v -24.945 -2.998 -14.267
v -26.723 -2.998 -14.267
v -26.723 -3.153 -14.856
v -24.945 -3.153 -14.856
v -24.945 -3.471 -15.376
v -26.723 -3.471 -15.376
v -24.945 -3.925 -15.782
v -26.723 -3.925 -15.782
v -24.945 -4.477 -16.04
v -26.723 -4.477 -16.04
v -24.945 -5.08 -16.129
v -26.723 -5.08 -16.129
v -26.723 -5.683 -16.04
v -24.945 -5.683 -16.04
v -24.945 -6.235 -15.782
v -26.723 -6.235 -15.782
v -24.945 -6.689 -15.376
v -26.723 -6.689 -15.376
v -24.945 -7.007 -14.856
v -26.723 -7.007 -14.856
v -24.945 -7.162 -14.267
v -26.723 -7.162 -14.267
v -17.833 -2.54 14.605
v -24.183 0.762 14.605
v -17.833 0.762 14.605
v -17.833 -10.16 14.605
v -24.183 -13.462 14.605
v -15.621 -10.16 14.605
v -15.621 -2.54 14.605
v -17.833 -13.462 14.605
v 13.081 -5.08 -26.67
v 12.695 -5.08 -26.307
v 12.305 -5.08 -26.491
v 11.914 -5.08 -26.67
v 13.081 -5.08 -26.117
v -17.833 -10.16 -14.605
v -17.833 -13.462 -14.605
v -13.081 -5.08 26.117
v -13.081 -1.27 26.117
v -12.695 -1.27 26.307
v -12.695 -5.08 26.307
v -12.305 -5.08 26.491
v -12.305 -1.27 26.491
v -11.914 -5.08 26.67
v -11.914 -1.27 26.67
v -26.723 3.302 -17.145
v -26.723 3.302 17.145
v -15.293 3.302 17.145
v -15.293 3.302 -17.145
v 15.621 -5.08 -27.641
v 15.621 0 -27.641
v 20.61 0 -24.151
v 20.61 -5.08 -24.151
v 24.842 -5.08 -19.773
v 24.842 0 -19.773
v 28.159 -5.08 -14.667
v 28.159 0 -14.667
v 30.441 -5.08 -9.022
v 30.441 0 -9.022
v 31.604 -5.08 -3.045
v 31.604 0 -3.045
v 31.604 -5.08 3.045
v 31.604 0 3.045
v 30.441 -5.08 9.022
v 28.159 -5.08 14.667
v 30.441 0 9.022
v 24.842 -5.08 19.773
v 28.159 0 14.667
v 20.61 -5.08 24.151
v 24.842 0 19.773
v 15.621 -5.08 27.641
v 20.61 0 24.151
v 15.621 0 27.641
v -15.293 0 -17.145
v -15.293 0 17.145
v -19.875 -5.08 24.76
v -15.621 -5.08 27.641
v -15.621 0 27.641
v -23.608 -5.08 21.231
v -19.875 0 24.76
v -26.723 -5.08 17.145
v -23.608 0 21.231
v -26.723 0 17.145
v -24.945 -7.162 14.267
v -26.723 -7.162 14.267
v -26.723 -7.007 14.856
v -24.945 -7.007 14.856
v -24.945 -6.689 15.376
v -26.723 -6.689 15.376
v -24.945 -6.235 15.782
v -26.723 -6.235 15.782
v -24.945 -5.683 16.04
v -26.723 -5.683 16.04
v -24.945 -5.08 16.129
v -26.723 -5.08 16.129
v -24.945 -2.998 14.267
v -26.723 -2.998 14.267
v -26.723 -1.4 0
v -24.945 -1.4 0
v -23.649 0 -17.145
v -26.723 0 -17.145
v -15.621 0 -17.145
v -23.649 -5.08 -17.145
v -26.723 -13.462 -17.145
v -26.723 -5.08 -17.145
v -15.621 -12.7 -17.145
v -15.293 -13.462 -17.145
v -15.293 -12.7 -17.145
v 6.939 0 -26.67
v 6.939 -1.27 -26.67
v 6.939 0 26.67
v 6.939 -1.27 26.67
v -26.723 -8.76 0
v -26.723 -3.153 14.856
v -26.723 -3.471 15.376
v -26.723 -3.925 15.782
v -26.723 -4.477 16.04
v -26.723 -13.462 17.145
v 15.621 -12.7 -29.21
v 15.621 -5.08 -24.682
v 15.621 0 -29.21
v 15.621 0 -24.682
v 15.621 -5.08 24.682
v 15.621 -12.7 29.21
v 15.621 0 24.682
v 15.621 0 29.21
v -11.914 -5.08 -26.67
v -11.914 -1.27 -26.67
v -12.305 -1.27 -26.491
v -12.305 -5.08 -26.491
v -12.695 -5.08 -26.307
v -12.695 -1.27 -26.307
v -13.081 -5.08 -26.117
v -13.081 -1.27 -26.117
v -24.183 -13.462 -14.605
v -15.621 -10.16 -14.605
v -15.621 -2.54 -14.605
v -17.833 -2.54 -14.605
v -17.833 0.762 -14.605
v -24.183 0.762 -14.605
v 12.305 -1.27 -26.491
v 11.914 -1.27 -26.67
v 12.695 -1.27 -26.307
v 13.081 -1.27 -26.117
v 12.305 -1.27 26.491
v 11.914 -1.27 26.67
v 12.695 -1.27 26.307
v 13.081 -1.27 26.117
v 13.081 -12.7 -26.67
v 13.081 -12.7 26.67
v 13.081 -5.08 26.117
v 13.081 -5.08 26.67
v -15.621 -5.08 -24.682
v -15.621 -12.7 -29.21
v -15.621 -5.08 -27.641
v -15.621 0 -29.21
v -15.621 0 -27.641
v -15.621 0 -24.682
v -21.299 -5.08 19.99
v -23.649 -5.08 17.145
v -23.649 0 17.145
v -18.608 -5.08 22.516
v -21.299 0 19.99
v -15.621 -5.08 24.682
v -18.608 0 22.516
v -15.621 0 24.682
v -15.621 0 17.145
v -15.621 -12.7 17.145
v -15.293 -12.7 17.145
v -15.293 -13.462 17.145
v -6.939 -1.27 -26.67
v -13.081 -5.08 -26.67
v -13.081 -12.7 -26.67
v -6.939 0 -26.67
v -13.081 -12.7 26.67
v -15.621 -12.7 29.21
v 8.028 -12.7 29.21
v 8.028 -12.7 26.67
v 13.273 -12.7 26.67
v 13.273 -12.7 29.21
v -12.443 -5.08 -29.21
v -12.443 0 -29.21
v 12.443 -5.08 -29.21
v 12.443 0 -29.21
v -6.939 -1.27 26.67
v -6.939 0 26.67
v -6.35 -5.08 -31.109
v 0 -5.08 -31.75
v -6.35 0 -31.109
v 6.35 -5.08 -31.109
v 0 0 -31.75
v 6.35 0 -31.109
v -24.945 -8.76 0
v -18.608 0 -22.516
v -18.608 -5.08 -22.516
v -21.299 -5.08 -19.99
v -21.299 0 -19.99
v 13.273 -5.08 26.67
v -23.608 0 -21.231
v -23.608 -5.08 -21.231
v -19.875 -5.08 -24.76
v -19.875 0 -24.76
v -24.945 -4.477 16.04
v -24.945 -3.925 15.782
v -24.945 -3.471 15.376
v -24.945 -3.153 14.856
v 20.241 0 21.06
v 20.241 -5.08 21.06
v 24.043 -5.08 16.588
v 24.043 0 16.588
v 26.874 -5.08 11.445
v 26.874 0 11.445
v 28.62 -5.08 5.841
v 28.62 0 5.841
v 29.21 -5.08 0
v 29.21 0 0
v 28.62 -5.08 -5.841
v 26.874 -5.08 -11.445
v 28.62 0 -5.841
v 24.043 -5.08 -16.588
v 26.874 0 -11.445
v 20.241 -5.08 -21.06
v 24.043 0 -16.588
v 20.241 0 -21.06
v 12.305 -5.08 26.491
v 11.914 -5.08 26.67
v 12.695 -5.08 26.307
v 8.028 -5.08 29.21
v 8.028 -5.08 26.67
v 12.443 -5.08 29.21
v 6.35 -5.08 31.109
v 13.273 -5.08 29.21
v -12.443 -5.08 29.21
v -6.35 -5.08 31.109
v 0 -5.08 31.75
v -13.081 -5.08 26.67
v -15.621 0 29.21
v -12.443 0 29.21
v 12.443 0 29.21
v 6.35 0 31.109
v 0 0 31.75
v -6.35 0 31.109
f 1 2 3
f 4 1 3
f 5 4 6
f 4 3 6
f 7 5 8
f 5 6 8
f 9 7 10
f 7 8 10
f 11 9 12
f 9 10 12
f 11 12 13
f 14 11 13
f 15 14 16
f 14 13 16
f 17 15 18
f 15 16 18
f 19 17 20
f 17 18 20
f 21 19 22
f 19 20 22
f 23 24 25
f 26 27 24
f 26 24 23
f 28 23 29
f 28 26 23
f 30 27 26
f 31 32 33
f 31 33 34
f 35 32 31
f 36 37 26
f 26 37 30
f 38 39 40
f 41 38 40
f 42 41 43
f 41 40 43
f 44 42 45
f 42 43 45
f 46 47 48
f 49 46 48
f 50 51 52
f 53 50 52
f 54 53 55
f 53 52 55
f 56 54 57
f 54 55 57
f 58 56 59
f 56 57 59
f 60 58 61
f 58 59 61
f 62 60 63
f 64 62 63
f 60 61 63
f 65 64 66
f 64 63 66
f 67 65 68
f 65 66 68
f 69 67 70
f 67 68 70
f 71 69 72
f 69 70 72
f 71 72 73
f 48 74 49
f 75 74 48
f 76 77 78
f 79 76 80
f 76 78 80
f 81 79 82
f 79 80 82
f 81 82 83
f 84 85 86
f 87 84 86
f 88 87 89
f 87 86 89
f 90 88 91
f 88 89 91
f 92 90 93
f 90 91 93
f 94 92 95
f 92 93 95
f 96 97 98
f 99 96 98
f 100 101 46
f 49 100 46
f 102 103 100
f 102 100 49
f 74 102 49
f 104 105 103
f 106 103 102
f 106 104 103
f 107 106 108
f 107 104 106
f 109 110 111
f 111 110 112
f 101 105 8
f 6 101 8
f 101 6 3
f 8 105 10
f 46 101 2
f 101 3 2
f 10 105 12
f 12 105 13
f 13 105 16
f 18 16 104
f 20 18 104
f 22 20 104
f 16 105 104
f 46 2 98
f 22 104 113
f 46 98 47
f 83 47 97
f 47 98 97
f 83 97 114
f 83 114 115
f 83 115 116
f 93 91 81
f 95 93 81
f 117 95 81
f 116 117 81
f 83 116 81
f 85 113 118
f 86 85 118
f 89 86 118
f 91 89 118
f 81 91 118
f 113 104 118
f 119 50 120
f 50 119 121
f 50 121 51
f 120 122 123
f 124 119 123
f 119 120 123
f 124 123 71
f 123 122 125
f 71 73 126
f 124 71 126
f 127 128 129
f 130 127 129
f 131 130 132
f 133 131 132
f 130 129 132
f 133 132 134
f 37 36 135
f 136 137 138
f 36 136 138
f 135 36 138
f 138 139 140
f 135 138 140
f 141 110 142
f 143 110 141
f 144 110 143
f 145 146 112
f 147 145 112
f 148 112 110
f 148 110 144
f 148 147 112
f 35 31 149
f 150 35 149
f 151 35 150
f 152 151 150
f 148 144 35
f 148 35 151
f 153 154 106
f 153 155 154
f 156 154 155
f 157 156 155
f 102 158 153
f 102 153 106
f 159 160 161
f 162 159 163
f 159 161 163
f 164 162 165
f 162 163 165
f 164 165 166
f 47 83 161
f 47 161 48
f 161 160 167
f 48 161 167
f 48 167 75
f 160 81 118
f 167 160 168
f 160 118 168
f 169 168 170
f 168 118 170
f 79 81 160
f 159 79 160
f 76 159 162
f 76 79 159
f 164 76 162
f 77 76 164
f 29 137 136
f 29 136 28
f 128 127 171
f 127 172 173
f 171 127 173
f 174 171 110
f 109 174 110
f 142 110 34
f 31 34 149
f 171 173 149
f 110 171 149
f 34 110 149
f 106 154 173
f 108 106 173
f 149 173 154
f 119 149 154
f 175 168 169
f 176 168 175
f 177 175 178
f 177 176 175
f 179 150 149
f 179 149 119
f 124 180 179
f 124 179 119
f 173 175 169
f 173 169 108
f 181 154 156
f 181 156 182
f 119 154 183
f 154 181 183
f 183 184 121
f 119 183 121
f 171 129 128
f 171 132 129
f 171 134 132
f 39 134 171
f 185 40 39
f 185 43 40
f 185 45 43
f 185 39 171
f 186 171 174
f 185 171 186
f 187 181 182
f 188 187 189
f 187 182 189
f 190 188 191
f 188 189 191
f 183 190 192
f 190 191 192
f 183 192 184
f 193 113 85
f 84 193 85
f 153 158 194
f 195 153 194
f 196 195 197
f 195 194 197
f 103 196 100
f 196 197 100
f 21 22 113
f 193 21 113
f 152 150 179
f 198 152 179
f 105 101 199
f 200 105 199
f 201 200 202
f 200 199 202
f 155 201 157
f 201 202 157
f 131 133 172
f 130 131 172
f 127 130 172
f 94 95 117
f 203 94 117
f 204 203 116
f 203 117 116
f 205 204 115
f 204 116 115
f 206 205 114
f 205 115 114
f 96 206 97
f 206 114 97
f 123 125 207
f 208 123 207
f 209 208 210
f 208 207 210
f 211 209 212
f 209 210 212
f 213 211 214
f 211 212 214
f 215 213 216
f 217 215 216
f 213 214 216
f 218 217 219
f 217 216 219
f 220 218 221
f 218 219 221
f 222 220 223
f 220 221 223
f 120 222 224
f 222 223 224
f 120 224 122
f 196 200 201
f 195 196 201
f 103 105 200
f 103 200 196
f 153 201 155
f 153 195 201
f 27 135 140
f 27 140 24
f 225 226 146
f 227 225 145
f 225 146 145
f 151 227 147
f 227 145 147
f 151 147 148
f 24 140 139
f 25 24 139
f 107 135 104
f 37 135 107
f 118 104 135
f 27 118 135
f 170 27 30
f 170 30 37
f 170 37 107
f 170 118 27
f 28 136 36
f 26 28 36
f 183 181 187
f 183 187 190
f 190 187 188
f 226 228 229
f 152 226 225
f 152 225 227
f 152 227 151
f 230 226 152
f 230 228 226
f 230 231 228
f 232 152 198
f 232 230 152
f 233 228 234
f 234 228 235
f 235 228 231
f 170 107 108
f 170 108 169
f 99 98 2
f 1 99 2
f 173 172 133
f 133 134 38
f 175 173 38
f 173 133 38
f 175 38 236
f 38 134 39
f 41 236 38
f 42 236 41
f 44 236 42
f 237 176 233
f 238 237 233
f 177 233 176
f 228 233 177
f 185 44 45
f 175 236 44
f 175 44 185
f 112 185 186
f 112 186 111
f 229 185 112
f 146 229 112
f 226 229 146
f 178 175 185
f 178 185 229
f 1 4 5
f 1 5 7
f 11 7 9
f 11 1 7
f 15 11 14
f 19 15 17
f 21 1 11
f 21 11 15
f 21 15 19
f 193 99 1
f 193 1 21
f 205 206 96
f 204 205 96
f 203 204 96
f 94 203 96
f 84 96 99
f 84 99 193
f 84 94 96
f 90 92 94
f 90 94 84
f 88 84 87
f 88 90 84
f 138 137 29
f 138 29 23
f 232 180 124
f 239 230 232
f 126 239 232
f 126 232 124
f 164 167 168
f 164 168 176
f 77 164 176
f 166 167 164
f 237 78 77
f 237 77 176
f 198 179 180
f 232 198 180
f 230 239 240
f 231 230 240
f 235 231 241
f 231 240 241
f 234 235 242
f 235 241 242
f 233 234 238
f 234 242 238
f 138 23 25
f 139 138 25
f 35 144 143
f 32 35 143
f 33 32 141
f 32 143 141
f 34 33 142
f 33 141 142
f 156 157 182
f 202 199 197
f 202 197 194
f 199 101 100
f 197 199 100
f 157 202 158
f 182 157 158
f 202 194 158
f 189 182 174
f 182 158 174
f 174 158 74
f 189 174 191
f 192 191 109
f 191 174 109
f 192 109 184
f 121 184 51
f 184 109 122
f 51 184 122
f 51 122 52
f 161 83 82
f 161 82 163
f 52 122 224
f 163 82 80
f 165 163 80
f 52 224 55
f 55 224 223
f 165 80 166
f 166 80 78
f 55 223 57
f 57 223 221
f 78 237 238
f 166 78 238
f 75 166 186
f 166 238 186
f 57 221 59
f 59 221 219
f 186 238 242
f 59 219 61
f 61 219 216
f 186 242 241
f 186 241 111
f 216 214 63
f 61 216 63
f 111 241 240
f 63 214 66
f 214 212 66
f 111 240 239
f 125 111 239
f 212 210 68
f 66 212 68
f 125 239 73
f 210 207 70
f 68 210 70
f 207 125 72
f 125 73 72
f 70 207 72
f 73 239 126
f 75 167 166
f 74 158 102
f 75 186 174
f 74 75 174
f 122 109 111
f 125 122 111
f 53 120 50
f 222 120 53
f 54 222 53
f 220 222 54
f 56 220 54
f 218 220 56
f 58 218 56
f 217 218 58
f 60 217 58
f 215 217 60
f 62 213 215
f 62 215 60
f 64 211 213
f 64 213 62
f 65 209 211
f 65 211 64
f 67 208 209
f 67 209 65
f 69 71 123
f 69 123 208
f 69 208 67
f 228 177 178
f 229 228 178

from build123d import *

# Parameters (mm, degrees)
F1_DEPTH      = 5.08
F2_W          = 31.242
F2_H          = 58.42
F2_W_2        = 26.162
F2_H_2        = 53.34
F3_DEPTH      = 12.7
F6_W          = 31.242
F6_H          = 58.42
F7_DEPTH      = 1.27
F8_W          = 11.43
F8_H          = 34.29
F9_DEPTH      = 8.382
F10_T         = 2.54
F10_T3_DEPTH  = 10.16
F10_T5_DEPTH  = 8.153909223
F10_T7_DEPTH  = 5.4081357261
F10_T9_DEPTH  = 39.37
F10_T11_DEPTH = 8.0392489691
F10_T13_DEPTH = 17.78
F10_T15_DEPTH = 8.0392489691
F10_T17_DEPTH = 29.9668157867
F10_T19_DEPTH = 8.89
F10_T21_DEPTH = 28.9073120599
F10_T23_DEPTH = 6.24734397
F10_T25_DEPTH = 12.7
F10_T27_DEPTH = 6.24734397
F10_T29_DEPTH = 57.3145303032
F10_T31_DEPTH = 5.6327348484
F10_T33_DEPTH = 5.6327348484
F10_T36_ANGLE = 2.5336786408
F10_T38_ANGLE = 2.5336786408
F10_T40_ANGLE = 2.5336786408
F10_T42_ANGLE = 2.5336786408
F11_W         = 13.877093792
F11_H         = 53.34
F12_DEPTH     = 25.4
F14_DEPTH     = 7.62
F16_DEPTH     = 1.778


# Not quite as in the source:
# - a feature of the source that left no trace in its solid (it failed there, or was rolled back) is left out
# - a shell that OpenCascade refuses in one call is made with other operations: the cavity is built on its own and cut out


with BuildPart() as f1:
    # F0 (on Front) → F1 (new body)
    with BuildSketch(Plane.XZ):
        with BuildLine():
            Line((-26.7228642739, 17.145), (-26.7228642739, -17.145))
            ThreePointArc((-26.7228642739, -17.145), (31.75, 0), (-26.7228642739, 17.145))
        make_face()
        with BuildLine():
            ThreePointArc((-24.1828642739, 16.3833200393), (29.21, 0), (-24.1828642739, -16.3833200393))
            Line((-24.1828642739, -16.3833200393), (-24.1828642739, 16.3833200393))
        make_face(mode=Mode.SUBTRACT)
    extrude(amount=F1_DEPTH)

    # F2 (on Front) → F3 (join)
    with BuildSketch(Plane.XZ):
        Rectangle(F2_W, F2_H)
        Rectangle(F2_W_2, F2_H_2, mode=Mode.SUBTRACT)
    extrude(amount=F3_DEPTH)

    # F6 (on Front) → F7 (join)
    with BuildSketch(Plane.XZ):
        Rectangle(F6_W, F6_H)
    extrude(amount=F7_DEPTH)

    # F8 (on face) → F9 (join, symmetric)
    with BuildSketch(Plane.XZ.offset(5.08)):
        with Locations((-21.0078642739, 0)):
            Rectangle(F8_W, F8_H)
    extrude(amount=F9_DEPTH, both=True)

    # F10: shell of thickness 2.54, made by hand


with BuildPart() as f10_core1:
    # F10_t2: copy of F1
    add(f1.part)

    # the walls: a layer under each face that stays
    f10_faces = [f10_core1.faces().sort_by_distance(p)[0] for p in [
        (-26.7228642739, -5.08, 0),
        (-21.8127096171, -2.54, 23.0709384109),
        (-21.8127096171, -2.54, -23.0709384109),
        (2.5135678631, 0, 0),
        (-15.621, -6.35, 23.1775),
        (-21.1719321369, -5.08, 22.3931987794),
        (-21.1719321369, -5.08, -22.3931987794),
        (-15.621, -6.35, -23.1775),
        (-21.0078642739, -5.08, 17.145),
        (-21.0078642739, -5.08, -17.145),
        (-21.0078642739, 3.302, 0),
        (0, -6.35, 29.21),
        (0, -2.54, 31.75),
        (15.621, -6.35, 0),
        (31.75, -2.54, 0),
        (0, -6.35, -29.21),
        (0, -2.54, -31.75),
        (-19.9933612642, -2.54, -21.2952953809),
        (-15.2928642739, 1.651, 0),
        (-19.9933612642, -2.54, 21.2952953809),
        (29.21, -2.54, 0),
        (-13.3894285714, -12.7, -25.0371428571),
        (-15.2928642739, -13.081, 0),
        (0, -5.08, 30.48),
        (23.6855, -5.08, -18.4275983725),
        (0, -5.08, -30.48),
        (0, -6.985, 26.67),
        (-13.081, -6.985, 0),
        (13.081, -6.985, 0),
        (0, -6.985, -26.67),
        (-12.5003834528, -3.175, 26.4000854834),
        (0, -1.27, 0),
        (12.5003834528, -3.175, 26.4000854834),
        (12.497328015, -5.08, 26.5778775253),
        (-12.8864426717, -5.08, 26.3936325758),
        (-12.5003834528, -3.175, -26.4000854834),
        (-12.8864426717, -5.08, -26.5778775253),
        (12.5003834528, -3.175, -26.4000854834),
        (12.497328015, -5.08, -26.5778775253),
    ]]
    thicken(f10_faces, amount=-F10_T, mode=Mode.SUBTRACT)

    # F10_s4 → F10_t3 (cut)
    with BuildSketch(Plane.XZ.offset(-2.54)):
        Polygon((-15.6588968, 27.6635106768), (-14.37132, 25.430085754), (-13.081, 26.1592850891), (-13.081, 27.6413975587), align=None)
        Polygon((-15.6588968, -27.6635106768), (-14.37132, -25.430085754), (-13.081, -26.1592850891), (-13.081, -27.6413975587), align=None)
        Polygon((-15.6328165217, 24.6606858517), (-13.081, 24.6821485896), (-13.081, 29.2956343073), (-16.9793478261, 26.82842238), align=None)
        Polygon((-15.6328165217, -24.6606858517), (-13.081, -24.6821485896), (-13.081, -29.2956343073), (-16.9793478261, -26.82842238), align=None)
        Polygon((-23.6283907422, 17.1554913043), (-23.6489550509, 14.605), (-28.62768243, 14.605), (-25.7053859249, 18.6358695652), align=None)
        Polygon((-23.6283907422, -17.1554913043), (-23.6489550509, -14.605), (-28.62768243, -14.605), (-25.7053859249, -18.6358695652), align=None)
        Polygon((12.4533626197, 29.258768), (12.4434078933, 26.67), (11.9249325645, 26.67), (11.4479352619, 26.8732), align=None)
        Polygon((-12.4533626197, 29.258768), (-12.4434078933, 26.67), (-11.9249325644, 26.67), (-11.4479352619, 26.8732), align=None)
        Polygon((15.6588968, 27.6635106768), (13.081, 27.6413975587), (13.081, 26.1592850891), (14.37132, 25.430085754), align=None)
        Polygon((15.6328165217, 24.6606858517), (13.081, 24.6821485896), (13.081, 29.2956343073), (16.9793478261, 26.82842238), align=None)
        Polygon((15.6328165217, -24.6606858517), (13.081, -24.6821485896), (13.081, -29.2956343073), (16.9793478261, -26.82842238), align=None)
        Polygon((15.6588968, -27.6635106768), (13.081, -27.6413975587), (13.081, -26.1592850891), (14.37132, -25.430085754), align=None)
        Polygon((-12.4533626197, -29.258768), (-12.4434078933, -26.67), (-11.9249325645, -26.67), (-11.4479352619, -26.8732), align=None)
        Polygon((12.4533626197, -29.258768), (12.4434078933, -26.67), (11.9249325644, -26.67), (11.4479352619, -26.8732), align=None)
    extrude(amount=F10_T3_DEPTH, mode=Mode.SUBTRACT)

    # F10_s6 → F10_t5 (cut)
    with BuildSketch(Plane.YZ.offset(-29.2628642739)):
        Polygon((0.0254, 17.1704), (-2.54, 17.145), (-2.54, 14.605), (0, 14.605), align=None)
        Polygon((0.0254, -17.1704), (-2.54, -17.145), (-2.54, -14.605), (0, -14.605), align=None)
        Polygon((-5.1054, 17.1704), (-2.54, 17.145), (-2.54, 14.605), (-5.08, 14.605), align=None)
        Polygon((-5.1054, -17.1704), (-2.54, -17.145), (-2.54, -14.605), (-5.08, -14.605), align=None)
    extrude(amount=F10_T5_DEPTH, mode=Mode.SUBTRACT)

    # F10_s8 → F10_t7 (cut)
    with BuildSketch(Plane.YZ.offset(-18.161)):
        Polygon((0.0254, -17.1704), (-2.54, -17.145), (-2.54, -14.605), (0, -14.605), align=None)
        Polygon((0.0254, 17.1704), (-2.54, 17.145), (-2.54, 14.605), (0, 14.605), align=None)
        Polygon((-12.7254, 17.1704), (-12.7, 14.605), (-10.16, 14.605), (-10.16, 17.145), align=None)
        Polygon((-12.7254, -17.1704), (-12.7, -14.605), (-10.16, -14.605), (-10.16, -17.145), align=None)
    extrude(amount=F10_T7_DEPTH, mode=Mode.SUBTRACT)

    # F10_s10 → F10_t9 (cut)
    with BuildSketch(Plane.XY.offset(-19.685)):
        Polygon((-15.2674642739, 0.0254), (-15.2928642739, -2.54), (-17.8328642739, -2.54), (-17.8328642739, 0), align=None)
        Polygon((-15.2674642739, -12.7254), (-15.2928642739, -10.16), (-17.8328642739, -10.16), (-17.8328642739, -12.7), align=None)
    extrude(amount=F10_T9_DEPTH, mode=Mode.SUBTRACT)

    # F10_s12 → F10_t11 (cut)
    with BuildSketch(Plane.XY.offset(22.1421485896)):
        Polygon((-15.6464, -5.1054), (-13.081, -5.08), (-13.081, -2.54), (-15.621, -2.54), align=None)
        Polygon((15.6464, -5.1054), (13.081, -5.08), (13.081, -2.54), (15.621, -2.54), align=None)
    extrude(amount=F10_T11_DEPTH, mode=Mode.SUBTRACT)

    # F10_s14 → F10_t13 (cut)
    with BuildSketch(Plane.XZ.offset(-2.54)):
        Polygon((-15.6464, 17.1704), (-13.081, 17.145), (-13.081, 14.605), (-15.621, 14.605), align=None)
        Polygon((-15.6464, -17.1704), (-13.081, -17.145), (-13.081, -14.605), (-15.621, -14.605), align=None)
    extrude(amount=F10_T13_DEPTH, mode=Mode.SUBTRACT)

    # F10_s16 → F10_t15 (cut)
    with BuildSketch(Plane.XY.offset(-30.1813975587)):
        Polygon((-15.6464, -5.1054), (-15.621, -2.54), (-13.081, -2.54), (-13.081, -5.08), align=None)
        Polygon((15.6464, -5.1054), (13.081, -5.08), (13.081, -2.54), (15.621, -2.54), align=None)
    extrude(amount=F10_T15_DEPTH, mode=Mode.SUBTRACT)

    # F10_s18 → F10_t17 (cut)
    with BuildSketch(Plane.YZ.offset(-14.9834078933)):
        Polygon((-5.1054, 29.2354), (-5.08, 26.67), (-2.54, 26.67), (-2.54, 29.21), align=None)
        Polygon((-5.1054, -29.2354), (-5.08, -26.67), (-2.54, -26.67), (-2.54, -29.21), align=None)
    extrude(amount=F10_T17_DEPTH, mode=Mode.SUBTRACT)

    # F10_s20 → F10_t19 (cut)
    with BuildSketch(Plane.XZ.offset(-1.27)):
        Polygon((-11.9032963291, 26.6214086957), (-11.91365603, 29.21), (-12.4551858495, 29.21), (-12.9496261195, 28.9891304348), align=None)
        Polygon((11.9032963291, 26.6214086957), (11.91365603, 29.21), (12.4551858495, 29.21), (12.9496261195, 28.9891304348), align=None)
        Polygon((-13.0442252174, -26.0945544863), (-15.621, -26.1172651516), (-15.621, -27.6858696652), (-14.2184782609, -28.3883316865), align=None)
        Polygon((-13.0442252174, 26.0945544863), (-15.621, 26.1172651516), (-15.621, 27.6858696652), (-14.2184782609, 28.3883316865), align=None)
        Polygon((13.0442252174, 26.0945544863), (15.621, 26.1172651516), (15.621, 27.6858696652), (14.2184782609, 28.3883316865), align=None)
        Polygon((13.0442252174, -26.0945544863), (15.621, -26.1172651516), (15.621, -27.6858696652), (14.2184782609, -28.3883316865), align=None)
        Polygon((11.9032963291, -26.6214086957), (11.91365603, -29.21), (12.4551858495, -29.21), (12.9496261195, -28.9891304348), align=None)
        Polygon((-11.9032963291, -26.6214086957), (-11.91365603, -29.21), (-12.4551858495, -29.21), (-12.9496261195, -28.9891304348), align=None)
    extrude(amount=F10_T19_DEPTH, mode=Mode.SUBTRACT)

    # F10_s22 → F10_t21 (cut)
    with BuildSketch(Plane.YZ.offset(-14.45365603)):
        Polygon((-1.2954, 26.6446), (-1.27, 29.21), (1.27, 29.21), (1.27, 26.67), align=None)
        Polygon((-1.2954, -26.6446), (-1.27, -29.21), (1.27, -29.21), (1.27, -26.67), align=None)
    extrude(amount=F10_T21_DEPTH, mode=Mode.SUBTRACT)

    # F10_s24 → F10_t23 (cut)
    with BuildSketch(Plane.YZ.offset(9.37365603)):
        Polygon((-5.1054, 26.6446), (-5.08, 29.21), (-2.54, 29.21), (-2.54, 26.67), align=None)
        Polygon((-5.1054, -26.6446), (-5.08, -29.21), (-2.54, -29.21), (-2.54, -26.67), align=None)
    extrude(amount=F10_T23_DEPTH, mode=Mode.SUBTRACT)

    # F10_s26 → F10_t25 (cut)
    with BuildSketch(Plane.XZ.offset(2.54)):
        Polygon((13.0556, 26.6446), (13.081, 29.21), (15.621, 29.21), (15.621, 26.67), align=None)
        Polygon((-13.0556, 26.6446), (-13.081, 29.21), (-15.621, 29.21), (-15.621, 26.67), align=None)
        Polygon((-13.0556, -26.6446), (-15.621, -26.67), (-15.621, -29.21), (-13.081, -29.21), align=None)
        Polygon((13.0556, -26.6446), (15.621, -26.67), (15.621, -29.21), (13.081, -29.21), align=None)
    extrude(amount=F10_T25_DEPTH, mode=Mode.SUBTRACT)

    # F10_s28 → F10_t27 (cut)
    with BuildSketch(Plane.YZ.offset(-15.621)):
        Polygon((-5.1054, 26.6446), (-5.08, 29.21), (-2.54, 29.21), (-2.54, 26.67), align=None)
        Polygon((-5.1054, -26.6446), (-5.08, -29.21), (-2.54, -29.21), (-2.54, -26.67), align=None)
    extrude(amount=F10_T27_DEPTH, mode=Mode.SUBTRACT)

    # F10_s30 → F10_t29 (cut)
    with BuildSketch(Plane.XY.offset(-28.6572651516)):
        Polygon((-13.0556, -1.2954), (-15.621, -1.27), (-15.621, 1.27), (-13.081, 1.27), align=None)
        Polygon((13.0556, -1.2954), (15.621, -1.27), (15.621, 1.27), (13.081, 1.27), align=None)
    extrude(amount=F10_T29_DEPTH, mode=Mode.SUBTRACT)

    # F10_s32 → F10_t31 (cut)
    with BuildSketch(Plane.XY.offset(23.5772651516)):
        Polygon((-13.0556, -5.1054), (-15.621, -5.08), (-15.621, -2.54), (-13.081, -2.54), align=None)
        Polygon((13.0556, -5.1054), (15.621, -5.08), (15.621, -2.54), (13.081, -2.54), align=None)
    extrude(amount=F10_T31_DEPTH, mode=Mode.SUBTRACT)

    # F10_s34 → F10_t33 (cut)
    with BuildSketch(Plane.XY.offset(-29.21)):
        Polygon((-13.0556, -5.1054), (-15.621, -5.08), (-15.621, -2.54), (-13.081, -2.54), align=None)
        Polygon((13.0556, -5.1054), (15.621, -5.08), (15.621, -2.54), (13.081, -2.54), align=None)
    extrude(amount=F10_T33_DEPTH, mode=Mode.SUBTRACT)

    # F10_s35 → F10_t36 (revolve, cut)
    with BuildSketch(Plane(origin=(0, 0, 0), x_dir=(0, 1, 0), z_dir=(-0.894120683, 0, -0.447826087))):
        Polygon((-1.2954, -29.1846), (-1.27, -31.75), (1.27, -31.75), (1.27, -29.21), align=None)
    revolve(axis=Axis((0, -1.27, 0), (0, 1, 0)), revolution_arc=F10_T36_ANGLE, mode=Mode.SUBTRACT)

    # F10_s37 → F10_t38 (revolve, cut)
    with BuildSketch(Plane(origin=(0, 0, 0), x_dir=(0, 1, 0), z_dir=(-0.9130434783, 0, 0.40786224))):
        Polygon((-1.2954, -29.1846), (1.27, -29.21), (1.27, -31.75), (-1.27, -31.75), align=None)
    revolve(axis=Axis((0, -1.27, 0), (0, 1, 0)), revolution_arc=F10_T38_ANGLE, mode=Mode.SUBTRACT)

    # F10_s39 → F10_t40 (revolve, cut)
    with BuildSketch(Plane(origin=(0, 0, 0), x_dir=(0, 1, 0), z_dir=(0.894120683, 0, 0.447826087))):
        Polygon((-1.2954, -29.1846), (1.27, -29.21), (1.27, -31.75), (-1.27, -31.75), align=None)
    revolve(axis=Axis((0, -1.27, 0), (0, 1, 0)), revolution_arc=F10_T40_ANGLE, mode=Mode.SUBTRACT)

    # F10_s41 → F10_t42 (revolve, cut)
    with BuildSketch(Plane(origin=(0, 0, 0), x_dir=(0, 1, 0), z_dir=(0.9130434783, 0, -0.40786224))):
        Polygon((-1.2954, -29.1846), (1.27, -29.21), (1.27, -31.75), (-1.27, -31.75), align=None)
    revolve(axis=Axis((0, -1.27, 0), (0, 1, 0)), revolution_arc=F10_T42_ANGLE, mode=Mode.SUBTRACT)


with BuildPart() as f1_1:
    add(f1.part)

    # what is left inside the walls is the cavity
    f10_cavity = [f10_core1.part.solids().sort_by_distance(p)[0] for p in [
        (-24.157464, -8.720667, 0),
    ]]
    add(f10_cavity, mode=Mode.SUBTRACT)

    # F11 (on face) → F12 (cut)
    with BuildSketch(Plane.XZ.offset(1.27)):
        Rectangle(F11_W, F11_H)
    extrude(amount=-F12_DEPTH, mode=Mode.SUBTRACT)

    # F13 (on face) → F14 (cut)
    with BuildSketch(Plane.XZ.offset(12.7)):
        Polygon((13.2733471692, 26.67), (13.2733471692, 29.21), (8.0283172429, 29.21), (8.0283172429, 26.67), (13.081, 26.67), align=None)
    extrude(amount=-F14_DEPTH, mode=Mode.SUBTRACT)

    # F15 (on face) → F16 (cut)
    with BuildSketch(Plane(origin=(-26.7228642739, 0, 0), x_dir=(0, -1, 0), z_dir=(-1, 0, 0))):
        with BuildLine():
            Line((8.7604723504, 0), (7.1624774839, 14.2667547511))
            ThreePointArc((7.1624774839, 14.2667547511), (6.4768419594, 15.5955348237), (5.08, 16.129))
            ThreePointArc((5.08, 16.129), (3.6831580406, 15.5955348237), (2.9975225161, 14.2667547511))
            Line((2.9975225161, 14.2667547511), (1.3995276496, 0))
            Line((1.3995276496, 0), (2.9975225161, -14.2667547511))
            ThreePointArc((2.9975225161, -14.2667547511), (3.6831580406, -15.5955348237), (5.08, -16.129))
            ThreePointArc((5.08, -16.129), (6.4768419594, -15.5955348237), (7.1624774839, -14.2667547511))
            Line((7.1624774839, -14.2667547511), (8.7604723504, 0))
        make_face()
    extrude(amount=-F16_DEPTH, mode=Mode.SUBTRACT)


solid = f1_1.part
